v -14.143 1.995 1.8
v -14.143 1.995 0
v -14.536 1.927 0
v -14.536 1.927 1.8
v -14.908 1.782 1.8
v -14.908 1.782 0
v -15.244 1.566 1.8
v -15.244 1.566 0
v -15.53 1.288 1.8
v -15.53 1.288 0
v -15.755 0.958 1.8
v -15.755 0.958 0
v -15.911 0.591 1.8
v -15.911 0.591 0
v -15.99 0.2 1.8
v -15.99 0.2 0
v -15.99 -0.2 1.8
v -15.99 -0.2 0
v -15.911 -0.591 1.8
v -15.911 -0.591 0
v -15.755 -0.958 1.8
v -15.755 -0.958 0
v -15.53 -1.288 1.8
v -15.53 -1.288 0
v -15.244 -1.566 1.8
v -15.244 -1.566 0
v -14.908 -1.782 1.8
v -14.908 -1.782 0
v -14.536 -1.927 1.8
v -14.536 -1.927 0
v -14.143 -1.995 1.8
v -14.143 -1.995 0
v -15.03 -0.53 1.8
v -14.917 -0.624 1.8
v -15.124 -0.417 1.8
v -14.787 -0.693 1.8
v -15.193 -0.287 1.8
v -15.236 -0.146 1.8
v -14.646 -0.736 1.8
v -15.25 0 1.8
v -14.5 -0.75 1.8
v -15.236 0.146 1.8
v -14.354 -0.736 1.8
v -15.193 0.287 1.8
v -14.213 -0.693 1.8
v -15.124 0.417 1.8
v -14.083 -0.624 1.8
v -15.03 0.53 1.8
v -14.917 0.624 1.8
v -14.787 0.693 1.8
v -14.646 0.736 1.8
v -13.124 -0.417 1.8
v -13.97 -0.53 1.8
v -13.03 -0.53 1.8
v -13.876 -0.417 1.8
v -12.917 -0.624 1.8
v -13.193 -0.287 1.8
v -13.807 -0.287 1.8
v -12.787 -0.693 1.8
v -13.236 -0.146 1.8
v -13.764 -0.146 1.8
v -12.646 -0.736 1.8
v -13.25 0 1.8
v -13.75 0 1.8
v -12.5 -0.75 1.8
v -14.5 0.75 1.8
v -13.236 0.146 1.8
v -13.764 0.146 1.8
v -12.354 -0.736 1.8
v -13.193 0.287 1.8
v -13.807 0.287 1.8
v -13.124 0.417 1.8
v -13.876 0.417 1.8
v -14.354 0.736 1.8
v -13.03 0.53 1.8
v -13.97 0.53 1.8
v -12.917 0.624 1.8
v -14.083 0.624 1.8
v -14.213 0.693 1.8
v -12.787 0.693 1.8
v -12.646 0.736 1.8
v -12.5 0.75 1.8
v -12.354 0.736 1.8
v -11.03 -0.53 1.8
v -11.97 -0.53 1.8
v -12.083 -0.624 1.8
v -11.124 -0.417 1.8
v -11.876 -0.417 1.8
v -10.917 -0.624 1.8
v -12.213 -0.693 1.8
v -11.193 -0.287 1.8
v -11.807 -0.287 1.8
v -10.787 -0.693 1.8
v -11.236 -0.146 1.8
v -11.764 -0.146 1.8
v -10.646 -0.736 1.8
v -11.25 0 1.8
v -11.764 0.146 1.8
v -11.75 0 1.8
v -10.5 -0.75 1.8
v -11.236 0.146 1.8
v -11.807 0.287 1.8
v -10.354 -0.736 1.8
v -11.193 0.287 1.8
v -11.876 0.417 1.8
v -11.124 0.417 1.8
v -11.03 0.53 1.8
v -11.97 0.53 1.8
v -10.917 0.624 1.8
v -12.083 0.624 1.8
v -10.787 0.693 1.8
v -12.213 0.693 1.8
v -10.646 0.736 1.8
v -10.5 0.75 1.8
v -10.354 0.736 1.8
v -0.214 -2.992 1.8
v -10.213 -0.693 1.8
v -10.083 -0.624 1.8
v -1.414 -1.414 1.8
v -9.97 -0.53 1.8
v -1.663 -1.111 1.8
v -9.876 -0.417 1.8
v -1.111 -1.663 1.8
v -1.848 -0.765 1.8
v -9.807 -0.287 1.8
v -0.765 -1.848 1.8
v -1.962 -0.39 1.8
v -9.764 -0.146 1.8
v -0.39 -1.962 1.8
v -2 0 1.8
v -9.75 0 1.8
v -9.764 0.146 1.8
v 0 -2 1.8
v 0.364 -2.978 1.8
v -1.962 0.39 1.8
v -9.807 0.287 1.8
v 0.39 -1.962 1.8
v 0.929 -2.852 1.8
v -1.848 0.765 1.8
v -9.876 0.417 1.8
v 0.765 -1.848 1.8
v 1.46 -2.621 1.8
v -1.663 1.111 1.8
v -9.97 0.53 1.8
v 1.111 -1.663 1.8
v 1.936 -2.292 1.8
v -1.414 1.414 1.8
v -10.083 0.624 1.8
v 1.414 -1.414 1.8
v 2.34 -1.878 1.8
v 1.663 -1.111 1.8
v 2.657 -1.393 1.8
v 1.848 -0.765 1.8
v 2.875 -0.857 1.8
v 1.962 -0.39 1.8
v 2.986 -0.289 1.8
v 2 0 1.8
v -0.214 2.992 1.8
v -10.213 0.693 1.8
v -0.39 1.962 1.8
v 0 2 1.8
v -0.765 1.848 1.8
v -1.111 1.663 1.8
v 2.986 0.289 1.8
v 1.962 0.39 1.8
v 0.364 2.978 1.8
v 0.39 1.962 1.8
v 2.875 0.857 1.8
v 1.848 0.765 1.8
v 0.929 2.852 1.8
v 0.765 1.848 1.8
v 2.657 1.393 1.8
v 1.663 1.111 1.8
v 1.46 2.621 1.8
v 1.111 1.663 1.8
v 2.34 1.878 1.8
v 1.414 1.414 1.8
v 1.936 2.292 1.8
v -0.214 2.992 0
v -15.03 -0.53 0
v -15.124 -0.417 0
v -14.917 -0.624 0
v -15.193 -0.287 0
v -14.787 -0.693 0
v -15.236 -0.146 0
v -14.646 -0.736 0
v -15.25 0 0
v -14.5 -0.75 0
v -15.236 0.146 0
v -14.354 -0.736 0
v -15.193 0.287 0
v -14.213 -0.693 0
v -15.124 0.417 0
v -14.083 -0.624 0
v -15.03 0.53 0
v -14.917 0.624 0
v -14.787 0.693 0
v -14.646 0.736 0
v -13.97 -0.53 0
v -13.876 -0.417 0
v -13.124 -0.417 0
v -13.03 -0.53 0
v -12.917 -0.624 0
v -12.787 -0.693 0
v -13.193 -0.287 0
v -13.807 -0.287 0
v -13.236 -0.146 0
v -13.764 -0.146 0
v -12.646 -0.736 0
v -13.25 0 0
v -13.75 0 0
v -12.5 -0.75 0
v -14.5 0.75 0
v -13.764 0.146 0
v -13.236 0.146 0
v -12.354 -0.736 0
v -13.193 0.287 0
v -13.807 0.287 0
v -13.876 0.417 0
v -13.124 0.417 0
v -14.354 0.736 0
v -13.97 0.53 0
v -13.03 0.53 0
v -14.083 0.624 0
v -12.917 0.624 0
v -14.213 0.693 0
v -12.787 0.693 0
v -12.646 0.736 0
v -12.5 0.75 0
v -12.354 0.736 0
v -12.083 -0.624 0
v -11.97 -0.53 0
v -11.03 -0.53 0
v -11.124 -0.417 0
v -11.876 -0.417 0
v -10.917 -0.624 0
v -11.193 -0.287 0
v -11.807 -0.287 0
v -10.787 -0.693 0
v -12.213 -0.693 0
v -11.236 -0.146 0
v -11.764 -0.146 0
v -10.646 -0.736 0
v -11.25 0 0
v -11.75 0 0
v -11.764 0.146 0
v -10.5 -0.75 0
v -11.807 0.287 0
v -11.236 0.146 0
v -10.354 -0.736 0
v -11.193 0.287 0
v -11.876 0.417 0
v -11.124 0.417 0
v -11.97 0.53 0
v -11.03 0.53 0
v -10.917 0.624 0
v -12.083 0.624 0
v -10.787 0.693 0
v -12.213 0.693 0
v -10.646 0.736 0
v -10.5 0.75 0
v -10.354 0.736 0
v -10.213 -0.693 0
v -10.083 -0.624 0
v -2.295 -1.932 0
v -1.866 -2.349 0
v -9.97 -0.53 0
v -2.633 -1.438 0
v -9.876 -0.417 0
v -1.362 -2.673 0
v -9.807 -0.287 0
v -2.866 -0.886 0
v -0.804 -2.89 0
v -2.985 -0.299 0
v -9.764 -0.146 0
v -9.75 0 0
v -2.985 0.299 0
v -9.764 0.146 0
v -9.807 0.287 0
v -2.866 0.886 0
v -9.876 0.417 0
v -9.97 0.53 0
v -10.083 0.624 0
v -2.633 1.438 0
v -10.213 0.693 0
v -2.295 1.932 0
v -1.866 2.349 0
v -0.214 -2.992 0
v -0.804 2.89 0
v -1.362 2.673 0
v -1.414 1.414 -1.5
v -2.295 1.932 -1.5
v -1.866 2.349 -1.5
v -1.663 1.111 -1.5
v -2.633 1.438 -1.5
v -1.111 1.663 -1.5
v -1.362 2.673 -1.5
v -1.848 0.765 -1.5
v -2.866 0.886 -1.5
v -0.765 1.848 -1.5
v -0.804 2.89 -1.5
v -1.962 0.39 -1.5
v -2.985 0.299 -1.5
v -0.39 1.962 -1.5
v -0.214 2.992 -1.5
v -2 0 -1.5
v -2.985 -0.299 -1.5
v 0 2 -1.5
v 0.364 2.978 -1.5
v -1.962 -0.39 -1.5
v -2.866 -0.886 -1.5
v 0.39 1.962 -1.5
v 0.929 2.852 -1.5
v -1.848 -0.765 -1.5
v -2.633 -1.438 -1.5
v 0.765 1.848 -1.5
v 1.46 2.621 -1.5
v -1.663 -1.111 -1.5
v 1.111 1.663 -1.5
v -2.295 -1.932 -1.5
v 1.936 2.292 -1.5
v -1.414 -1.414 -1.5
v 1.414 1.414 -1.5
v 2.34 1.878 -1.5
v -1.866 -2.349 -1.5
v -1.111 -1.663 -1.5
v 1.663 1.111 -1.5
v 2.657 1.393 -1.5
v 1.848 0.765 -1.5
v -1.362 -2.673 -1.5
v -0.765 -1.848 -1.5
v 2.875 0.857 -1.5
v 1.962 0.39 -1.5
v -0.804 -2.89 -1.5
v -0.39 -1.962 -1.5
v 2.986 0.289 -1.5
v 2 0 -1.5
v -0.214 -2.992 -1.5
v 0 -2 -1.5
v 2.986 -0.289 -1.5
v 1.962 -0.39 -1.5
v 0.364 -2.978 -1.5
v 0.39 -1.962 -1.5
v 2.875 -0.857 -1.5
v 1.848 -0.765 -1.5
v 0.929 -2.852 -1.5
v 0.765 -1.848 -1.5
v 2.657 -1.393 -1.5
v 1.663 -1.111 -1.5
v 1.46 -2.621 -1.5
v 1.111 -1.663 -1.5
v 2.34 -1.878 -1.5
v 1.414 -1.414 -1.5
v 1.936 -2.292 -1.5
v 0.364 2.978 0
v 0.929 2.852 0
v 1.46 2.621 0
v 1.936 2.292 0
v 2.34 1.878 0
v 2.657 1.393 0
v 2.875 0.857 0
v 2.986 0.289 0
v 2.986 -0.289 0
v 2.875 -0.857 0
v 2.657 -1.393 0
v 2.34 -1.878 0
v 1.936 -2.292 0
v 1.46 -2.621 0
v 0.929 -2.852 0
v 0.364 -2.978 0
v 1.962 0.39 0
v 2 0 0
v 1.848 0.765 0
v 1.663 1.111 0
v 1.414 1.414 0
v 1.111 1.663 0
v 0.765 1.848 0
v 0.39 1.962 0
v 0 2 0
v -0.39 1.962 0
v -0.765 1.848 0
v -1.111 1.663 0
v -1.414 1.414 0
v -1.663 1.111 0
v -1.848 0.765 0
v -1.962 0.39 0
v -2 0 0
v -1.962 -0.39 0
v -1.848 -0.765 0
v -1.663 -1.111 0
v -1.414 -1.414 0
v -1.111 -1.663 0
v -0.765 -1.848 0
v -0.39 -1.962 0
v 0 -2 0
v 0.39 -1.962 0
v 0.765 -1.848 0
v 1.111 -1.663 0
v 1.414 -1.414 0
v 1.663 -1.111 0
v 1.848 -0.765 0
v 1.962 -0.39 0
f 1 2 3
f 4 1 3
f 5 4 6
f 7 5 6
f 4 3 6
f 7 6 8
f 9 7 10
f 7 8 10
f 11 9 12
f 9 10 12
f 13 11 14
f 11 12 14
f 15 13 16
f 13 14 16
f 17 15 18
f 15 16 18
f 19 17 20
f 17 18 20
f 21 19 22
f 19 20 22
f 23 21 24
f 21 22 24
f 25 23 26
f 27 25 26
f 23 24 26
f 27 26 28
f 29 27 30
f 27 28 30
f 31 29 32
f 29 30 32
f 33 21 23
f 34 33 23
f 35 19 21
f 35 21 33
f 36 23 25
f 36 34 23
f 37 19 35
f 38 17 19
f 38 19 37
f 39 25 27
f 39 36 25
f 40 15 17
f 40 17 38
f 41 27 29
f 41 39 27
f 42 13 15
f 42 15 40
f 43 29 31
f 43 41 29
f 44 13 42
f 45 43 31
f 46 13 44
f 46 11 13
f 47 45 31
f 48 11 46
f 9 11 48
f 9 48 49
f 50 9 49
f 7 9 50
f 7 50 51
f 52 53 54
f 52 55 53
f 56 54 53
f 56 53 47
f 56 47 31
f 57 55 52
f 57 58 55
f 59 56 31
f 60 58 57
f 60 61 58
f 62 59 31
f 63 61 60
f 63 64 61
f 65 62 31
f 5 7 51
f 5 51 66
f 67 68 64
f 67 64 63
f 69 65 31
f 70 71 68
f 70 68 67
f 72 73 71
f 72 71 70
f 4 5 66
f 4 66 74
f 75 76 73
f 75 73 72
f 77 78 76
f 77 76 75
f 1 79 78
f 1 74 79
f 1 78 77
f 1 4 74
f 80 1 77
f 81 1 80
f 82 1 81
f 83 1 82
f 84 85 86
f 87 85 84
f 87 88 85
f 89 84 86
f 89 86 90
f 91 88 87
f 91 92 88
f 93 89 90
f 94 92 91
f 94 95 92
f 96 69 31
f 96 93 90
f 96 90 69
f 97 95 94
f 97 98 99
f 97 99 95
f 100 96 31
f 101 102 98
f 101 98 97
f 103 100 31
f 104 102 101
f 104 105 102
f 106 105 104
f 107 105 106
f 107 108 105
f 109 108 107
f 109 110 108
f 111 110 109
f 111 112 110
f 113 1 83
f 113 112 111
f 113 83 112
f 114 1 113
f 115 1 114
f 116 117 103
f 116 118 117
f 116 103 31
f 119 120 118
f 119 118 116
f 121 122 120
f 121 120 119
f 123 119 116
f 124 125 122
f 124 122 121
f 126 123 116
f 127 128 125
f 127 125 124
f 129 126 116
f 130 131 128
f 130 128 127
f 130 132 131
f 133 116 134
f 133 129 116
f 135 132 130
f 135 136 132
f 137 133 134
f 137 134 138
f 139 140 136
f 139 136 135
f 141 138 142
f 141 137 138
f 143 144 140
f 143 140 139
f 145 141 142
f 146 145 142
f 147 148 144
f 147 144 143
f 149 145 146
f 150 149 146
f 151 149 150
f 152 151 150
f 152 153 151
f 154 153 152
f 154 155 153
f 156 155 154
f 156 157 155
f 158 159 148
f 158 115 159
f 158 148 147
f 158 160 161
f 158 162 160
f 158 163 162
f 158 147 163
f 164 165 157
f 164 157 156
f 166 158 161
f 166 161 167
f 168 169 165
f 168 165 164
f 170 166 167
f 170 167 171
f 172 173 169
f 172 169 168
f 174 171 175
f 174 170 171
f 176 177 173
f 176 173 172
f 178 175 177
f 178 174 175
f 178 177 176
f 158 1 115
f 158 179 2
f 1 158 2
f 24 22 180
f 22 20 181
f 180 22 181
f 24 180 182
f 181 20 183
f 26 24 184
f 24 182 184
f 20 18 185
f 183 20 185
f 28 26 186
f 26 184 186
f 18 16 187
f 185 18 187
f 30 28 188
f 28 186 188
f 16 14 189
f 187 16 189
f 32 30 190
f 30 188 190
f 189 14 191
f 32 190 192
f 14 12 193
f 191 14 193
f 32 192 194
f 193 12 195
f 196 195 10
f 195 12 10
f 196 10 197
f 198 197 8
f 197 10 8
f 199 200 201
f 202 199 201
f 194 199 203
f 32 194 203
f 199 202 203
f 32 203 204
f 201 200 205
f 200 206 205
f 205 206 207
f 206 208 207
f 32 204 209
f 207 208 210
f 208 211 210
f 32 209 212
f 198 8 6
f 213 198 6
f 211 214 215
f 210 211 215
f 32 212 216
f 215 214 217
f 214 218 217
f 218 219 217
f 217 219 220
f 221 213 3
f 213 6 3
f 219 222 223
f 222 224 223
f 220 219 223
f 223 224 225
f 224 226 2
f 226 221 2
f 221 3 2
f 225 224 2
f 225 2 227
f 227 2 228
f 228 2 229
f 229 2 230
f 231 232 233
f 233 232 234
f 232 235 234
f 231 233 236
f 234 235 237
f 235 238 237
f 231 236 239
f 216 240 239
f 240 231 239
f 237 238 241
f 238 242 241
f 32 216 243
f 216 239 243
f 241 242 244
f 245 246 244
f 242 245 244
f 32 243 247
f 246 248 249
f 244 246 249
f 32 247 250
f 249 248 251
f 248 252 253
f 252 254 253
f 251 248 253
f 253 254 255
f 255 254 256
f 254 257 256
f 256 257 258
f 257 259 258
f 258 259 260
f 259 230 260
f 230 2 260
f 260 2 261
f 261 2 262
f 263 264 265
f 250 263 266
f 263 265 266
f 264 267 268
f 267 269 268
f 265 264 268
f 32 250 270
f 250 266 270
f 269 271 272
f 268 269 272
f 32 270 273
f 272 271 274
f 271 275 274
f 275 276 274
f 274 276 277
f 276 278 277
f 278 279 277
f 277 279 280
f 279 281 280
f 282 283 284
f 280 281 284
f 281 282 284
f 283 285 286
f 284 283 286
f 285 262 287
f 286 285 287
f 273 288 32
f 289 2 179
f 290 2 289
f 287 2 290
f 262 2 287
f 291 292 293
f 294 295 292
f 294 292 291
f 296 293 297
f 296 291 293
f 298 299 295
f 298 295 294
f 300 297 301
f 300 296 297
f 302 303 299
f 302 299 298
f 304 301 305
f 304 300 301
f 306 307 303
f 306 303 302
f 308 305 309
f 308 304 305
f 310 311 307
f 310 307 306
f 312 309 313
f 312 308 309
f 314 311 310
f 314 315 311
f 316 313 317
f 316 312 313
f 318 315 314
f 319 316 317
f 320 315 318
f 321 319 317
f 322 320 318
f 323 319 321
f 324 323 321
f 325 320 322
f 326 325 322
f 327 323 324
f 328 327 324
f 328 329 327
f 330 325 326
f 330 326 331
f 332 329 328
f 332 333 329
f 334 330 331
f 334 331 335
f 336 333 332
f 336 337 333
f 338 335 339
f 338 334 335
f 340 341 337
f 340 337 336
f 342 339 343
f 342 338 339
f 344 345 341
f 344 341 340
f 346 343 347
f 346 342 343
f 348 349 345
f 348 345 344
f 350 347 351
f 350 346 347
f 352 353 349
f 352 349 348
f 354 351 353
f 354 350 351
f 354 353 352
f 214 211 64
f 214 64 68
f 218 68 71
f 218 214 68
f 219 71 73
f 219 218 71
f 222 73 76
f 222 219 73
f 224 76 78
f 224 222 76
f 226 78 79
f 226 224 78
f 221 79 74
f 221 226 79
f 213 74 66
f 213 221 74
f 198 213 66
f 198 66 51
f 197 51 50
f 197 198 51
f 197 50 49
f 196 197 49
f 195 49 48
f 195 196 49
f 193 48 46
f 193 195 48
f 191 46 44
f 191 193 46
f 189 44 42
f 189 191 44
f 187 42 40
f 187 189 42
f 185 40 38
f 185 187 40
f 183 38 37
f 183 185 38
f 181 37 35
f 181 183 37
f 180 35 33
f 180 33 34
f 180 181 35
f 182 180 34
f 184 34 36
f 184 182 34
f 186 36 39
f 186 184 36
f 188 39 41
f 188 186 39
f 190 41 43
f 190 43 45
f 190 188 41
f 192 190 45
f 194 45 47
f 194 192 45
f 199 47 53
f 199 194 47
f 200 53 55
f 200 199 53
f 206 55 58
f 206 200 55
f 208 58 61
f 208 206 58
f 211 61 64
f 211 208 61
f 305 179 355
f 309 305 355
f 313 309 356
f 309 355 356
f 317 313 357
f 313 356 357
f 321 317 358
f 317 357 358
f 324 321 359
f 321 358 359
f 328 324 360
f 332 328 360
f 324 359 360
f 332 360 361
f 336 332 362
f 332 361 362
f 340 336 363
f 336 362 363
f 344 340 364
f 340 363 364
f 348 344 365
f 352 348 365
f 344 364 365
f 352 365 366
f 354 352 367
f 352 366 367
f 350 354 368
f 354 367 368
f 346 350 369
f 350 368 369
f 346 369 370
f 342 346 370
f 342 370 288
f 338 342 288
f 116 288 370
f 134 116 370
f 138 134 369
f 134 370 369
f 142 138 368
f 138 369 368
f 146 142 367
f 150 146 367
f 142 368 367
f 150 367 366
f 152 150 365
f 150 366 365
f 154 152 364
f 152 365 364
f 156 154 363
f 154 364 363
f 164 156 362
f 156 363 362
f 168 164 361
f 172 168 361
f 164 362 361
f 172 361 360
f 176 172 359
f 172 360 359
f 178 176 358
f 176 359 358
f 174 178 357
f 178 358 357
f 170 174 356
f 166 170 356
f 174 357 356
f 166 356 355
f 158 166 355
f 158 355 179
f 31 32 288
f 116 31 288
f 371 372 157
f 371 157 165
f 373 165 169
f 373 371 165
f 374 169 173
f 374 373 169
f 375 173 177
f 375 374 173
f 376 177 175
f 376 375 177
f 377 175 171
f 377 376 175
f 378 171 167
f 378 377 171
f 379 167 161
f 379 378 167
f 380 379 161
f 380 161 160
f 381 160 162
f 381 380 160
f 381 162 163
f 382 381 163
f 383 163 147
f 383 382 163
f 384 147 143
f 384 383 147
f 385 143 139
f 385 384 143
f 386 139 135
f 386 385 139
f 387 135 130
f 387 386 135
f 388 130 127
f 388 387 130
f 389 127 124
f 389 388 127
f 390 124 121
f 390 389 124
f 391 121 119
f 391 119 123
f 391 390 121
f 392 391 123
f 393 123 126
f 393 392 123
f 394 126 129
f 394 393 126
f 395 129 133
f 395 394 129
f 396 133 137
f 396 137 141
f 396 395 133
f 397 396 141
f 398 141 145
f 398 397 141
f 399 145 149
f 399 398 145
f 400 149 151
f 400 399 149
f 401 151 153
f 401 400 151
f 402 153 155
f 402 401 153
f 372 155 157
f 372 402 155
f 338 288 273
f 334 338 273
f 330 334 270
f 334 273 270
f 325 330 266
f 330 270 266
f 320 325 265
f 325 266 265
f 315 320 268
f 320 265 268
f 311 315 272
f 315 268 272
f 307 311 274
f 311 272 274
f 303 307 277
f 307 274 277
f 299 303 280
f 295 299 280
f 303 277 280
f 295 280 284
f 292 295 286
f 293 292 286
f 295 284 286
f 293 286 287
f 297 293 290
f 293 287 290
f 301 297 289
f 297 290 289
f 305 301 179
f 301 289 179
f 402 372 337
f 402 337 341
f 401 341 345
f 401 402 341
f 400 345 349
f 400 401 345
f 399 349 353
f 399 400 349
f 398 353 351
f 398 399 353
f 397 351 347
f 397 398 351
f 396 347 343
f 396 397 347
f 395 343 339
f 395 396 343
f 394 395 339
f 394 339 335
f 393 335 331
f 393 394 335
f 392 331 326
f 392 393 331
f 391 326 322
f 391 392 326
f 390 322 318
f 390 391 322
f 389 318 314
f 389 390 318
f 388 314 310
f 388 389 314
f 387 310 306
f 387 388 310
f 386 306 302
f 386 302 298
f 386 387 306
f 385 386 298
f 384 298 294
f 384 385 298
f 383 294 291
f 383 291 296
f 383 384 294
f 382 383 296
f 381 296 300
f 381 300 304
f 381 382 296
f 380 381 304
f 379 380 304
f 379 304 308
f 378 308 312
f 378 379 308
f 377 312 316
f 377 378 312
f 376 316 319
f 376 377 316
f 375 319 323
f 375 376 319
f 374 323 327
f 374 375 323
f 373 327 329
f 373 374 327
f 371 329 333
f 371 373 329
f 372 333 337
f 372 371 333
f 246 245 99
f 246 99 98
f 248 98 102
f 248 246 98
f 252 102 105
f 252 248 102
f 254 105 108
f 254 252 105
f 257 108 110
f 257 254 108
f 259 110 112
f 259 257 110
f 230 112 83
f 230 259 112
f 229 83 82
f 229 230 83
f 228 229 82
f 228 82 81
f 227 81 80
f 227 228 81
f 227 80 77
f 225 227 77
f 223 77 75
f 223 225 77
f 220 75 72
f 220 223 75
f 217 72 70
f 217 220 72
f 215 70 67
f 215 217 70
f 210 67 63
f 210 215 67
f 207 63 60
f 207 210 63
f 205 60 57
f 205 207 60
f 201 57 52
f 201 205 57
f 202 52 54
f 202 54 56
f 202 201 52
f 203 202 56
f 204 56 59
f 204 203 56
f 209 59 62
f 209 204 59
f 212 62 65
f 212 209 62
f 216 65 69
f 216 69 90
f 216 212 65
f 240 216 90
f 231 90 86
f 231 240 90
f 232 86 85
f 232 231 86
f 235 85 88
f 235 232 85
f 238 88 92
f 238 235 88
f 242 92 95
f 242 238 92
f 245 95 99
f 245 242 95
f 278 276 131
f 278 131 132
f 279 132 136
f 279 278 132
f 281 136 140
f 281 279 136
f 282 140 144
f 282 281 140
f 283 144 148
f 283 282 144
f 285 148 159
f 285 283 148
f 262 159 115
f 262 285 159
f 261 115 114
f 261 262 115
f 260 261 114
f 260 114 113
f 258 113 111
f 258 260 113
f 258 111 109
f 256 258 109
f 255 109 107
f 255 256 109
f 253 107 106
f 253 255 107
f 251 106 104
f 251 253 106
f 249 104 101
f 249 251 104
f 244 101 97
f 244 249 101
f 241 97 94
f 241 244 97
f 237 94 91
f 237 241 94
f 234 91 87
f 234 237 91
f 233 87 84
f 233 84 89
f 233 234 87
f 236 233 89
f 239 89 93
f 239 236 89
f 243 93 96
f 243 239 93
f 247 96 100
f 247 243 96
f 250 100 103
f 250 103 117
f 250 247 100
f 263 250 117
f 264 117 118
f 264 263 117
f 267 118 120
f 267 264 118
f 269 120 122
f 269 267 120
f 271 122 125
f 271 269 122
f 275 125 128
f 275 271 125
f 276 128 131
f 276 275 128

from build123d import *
from build123d import SkipClean  # not in build123d's __all__

# Parameters (mm, degrees)
F0_R     = 0.75
F0_R_2   = 2
F1_DEPTH = 1.8
F2_R     = 2
F3_DEPTH = 1.5


with BuildPart() as f1:
    # F0 (on Top) → F1 (new body)
    with BuildSketch(Plane.XY):
        with BuildLine():
            Line((-14.1428571429, -1.9948914348), (-0.2142857143, -2.9923371522))
            ThreePointArc((-0.2142857143, -2.9923371522), (3, 0), (-0.2142857143, 2.9923371522))
            Line((-0.2142857143, 2.9923371522), (-14.1428571429, 1.9948914348))
            ThreePointArc((-14.1428571429, 1.9948914348), (-16, 0), (-14.1428571429, -1.9948914348))
        make_face()
        with Locations((-14.5, 0)):
            Circle(F0_R, mode=Mode.SUBTRACT)
        with Locations((-12.5, 0)):
            Circle(F0_R, mode=Mode.SUBTRACT)
        with Locations((-10.5, 0)):
            Circle(F0_R, mode=Mode.SUBTRACT)
        Circle(F0_R_2, mode=Mode.SUBTRACT)
    extrude(amount=F1_DEPTH)

    # F2 (on face) → F3 (join)
    with BuildSketch(Plane(origin=(0, 0, 0), x_dir=(1, 0, 0), z_dir=(0, 0, -1))):
        with BuildLine():
            ThreePointArc((-0.2142857143, -2.9923371522), (3, 0), (-0.2142857143, 2.9923371522))
            ThreePointArc((-0.2142857143, 2.9923371522), (-3, 0), (-0.2142857143, -2.9923371522))
        make_face()
        Circle(F2_R, mode=Mode.SUBTRACT)
    with SkipClean():  # cleaning this boolean's faces spoils the solid; the shape is the same uncleaned
        extrude(amount=F3_DEPTH)


solid = f1.part
